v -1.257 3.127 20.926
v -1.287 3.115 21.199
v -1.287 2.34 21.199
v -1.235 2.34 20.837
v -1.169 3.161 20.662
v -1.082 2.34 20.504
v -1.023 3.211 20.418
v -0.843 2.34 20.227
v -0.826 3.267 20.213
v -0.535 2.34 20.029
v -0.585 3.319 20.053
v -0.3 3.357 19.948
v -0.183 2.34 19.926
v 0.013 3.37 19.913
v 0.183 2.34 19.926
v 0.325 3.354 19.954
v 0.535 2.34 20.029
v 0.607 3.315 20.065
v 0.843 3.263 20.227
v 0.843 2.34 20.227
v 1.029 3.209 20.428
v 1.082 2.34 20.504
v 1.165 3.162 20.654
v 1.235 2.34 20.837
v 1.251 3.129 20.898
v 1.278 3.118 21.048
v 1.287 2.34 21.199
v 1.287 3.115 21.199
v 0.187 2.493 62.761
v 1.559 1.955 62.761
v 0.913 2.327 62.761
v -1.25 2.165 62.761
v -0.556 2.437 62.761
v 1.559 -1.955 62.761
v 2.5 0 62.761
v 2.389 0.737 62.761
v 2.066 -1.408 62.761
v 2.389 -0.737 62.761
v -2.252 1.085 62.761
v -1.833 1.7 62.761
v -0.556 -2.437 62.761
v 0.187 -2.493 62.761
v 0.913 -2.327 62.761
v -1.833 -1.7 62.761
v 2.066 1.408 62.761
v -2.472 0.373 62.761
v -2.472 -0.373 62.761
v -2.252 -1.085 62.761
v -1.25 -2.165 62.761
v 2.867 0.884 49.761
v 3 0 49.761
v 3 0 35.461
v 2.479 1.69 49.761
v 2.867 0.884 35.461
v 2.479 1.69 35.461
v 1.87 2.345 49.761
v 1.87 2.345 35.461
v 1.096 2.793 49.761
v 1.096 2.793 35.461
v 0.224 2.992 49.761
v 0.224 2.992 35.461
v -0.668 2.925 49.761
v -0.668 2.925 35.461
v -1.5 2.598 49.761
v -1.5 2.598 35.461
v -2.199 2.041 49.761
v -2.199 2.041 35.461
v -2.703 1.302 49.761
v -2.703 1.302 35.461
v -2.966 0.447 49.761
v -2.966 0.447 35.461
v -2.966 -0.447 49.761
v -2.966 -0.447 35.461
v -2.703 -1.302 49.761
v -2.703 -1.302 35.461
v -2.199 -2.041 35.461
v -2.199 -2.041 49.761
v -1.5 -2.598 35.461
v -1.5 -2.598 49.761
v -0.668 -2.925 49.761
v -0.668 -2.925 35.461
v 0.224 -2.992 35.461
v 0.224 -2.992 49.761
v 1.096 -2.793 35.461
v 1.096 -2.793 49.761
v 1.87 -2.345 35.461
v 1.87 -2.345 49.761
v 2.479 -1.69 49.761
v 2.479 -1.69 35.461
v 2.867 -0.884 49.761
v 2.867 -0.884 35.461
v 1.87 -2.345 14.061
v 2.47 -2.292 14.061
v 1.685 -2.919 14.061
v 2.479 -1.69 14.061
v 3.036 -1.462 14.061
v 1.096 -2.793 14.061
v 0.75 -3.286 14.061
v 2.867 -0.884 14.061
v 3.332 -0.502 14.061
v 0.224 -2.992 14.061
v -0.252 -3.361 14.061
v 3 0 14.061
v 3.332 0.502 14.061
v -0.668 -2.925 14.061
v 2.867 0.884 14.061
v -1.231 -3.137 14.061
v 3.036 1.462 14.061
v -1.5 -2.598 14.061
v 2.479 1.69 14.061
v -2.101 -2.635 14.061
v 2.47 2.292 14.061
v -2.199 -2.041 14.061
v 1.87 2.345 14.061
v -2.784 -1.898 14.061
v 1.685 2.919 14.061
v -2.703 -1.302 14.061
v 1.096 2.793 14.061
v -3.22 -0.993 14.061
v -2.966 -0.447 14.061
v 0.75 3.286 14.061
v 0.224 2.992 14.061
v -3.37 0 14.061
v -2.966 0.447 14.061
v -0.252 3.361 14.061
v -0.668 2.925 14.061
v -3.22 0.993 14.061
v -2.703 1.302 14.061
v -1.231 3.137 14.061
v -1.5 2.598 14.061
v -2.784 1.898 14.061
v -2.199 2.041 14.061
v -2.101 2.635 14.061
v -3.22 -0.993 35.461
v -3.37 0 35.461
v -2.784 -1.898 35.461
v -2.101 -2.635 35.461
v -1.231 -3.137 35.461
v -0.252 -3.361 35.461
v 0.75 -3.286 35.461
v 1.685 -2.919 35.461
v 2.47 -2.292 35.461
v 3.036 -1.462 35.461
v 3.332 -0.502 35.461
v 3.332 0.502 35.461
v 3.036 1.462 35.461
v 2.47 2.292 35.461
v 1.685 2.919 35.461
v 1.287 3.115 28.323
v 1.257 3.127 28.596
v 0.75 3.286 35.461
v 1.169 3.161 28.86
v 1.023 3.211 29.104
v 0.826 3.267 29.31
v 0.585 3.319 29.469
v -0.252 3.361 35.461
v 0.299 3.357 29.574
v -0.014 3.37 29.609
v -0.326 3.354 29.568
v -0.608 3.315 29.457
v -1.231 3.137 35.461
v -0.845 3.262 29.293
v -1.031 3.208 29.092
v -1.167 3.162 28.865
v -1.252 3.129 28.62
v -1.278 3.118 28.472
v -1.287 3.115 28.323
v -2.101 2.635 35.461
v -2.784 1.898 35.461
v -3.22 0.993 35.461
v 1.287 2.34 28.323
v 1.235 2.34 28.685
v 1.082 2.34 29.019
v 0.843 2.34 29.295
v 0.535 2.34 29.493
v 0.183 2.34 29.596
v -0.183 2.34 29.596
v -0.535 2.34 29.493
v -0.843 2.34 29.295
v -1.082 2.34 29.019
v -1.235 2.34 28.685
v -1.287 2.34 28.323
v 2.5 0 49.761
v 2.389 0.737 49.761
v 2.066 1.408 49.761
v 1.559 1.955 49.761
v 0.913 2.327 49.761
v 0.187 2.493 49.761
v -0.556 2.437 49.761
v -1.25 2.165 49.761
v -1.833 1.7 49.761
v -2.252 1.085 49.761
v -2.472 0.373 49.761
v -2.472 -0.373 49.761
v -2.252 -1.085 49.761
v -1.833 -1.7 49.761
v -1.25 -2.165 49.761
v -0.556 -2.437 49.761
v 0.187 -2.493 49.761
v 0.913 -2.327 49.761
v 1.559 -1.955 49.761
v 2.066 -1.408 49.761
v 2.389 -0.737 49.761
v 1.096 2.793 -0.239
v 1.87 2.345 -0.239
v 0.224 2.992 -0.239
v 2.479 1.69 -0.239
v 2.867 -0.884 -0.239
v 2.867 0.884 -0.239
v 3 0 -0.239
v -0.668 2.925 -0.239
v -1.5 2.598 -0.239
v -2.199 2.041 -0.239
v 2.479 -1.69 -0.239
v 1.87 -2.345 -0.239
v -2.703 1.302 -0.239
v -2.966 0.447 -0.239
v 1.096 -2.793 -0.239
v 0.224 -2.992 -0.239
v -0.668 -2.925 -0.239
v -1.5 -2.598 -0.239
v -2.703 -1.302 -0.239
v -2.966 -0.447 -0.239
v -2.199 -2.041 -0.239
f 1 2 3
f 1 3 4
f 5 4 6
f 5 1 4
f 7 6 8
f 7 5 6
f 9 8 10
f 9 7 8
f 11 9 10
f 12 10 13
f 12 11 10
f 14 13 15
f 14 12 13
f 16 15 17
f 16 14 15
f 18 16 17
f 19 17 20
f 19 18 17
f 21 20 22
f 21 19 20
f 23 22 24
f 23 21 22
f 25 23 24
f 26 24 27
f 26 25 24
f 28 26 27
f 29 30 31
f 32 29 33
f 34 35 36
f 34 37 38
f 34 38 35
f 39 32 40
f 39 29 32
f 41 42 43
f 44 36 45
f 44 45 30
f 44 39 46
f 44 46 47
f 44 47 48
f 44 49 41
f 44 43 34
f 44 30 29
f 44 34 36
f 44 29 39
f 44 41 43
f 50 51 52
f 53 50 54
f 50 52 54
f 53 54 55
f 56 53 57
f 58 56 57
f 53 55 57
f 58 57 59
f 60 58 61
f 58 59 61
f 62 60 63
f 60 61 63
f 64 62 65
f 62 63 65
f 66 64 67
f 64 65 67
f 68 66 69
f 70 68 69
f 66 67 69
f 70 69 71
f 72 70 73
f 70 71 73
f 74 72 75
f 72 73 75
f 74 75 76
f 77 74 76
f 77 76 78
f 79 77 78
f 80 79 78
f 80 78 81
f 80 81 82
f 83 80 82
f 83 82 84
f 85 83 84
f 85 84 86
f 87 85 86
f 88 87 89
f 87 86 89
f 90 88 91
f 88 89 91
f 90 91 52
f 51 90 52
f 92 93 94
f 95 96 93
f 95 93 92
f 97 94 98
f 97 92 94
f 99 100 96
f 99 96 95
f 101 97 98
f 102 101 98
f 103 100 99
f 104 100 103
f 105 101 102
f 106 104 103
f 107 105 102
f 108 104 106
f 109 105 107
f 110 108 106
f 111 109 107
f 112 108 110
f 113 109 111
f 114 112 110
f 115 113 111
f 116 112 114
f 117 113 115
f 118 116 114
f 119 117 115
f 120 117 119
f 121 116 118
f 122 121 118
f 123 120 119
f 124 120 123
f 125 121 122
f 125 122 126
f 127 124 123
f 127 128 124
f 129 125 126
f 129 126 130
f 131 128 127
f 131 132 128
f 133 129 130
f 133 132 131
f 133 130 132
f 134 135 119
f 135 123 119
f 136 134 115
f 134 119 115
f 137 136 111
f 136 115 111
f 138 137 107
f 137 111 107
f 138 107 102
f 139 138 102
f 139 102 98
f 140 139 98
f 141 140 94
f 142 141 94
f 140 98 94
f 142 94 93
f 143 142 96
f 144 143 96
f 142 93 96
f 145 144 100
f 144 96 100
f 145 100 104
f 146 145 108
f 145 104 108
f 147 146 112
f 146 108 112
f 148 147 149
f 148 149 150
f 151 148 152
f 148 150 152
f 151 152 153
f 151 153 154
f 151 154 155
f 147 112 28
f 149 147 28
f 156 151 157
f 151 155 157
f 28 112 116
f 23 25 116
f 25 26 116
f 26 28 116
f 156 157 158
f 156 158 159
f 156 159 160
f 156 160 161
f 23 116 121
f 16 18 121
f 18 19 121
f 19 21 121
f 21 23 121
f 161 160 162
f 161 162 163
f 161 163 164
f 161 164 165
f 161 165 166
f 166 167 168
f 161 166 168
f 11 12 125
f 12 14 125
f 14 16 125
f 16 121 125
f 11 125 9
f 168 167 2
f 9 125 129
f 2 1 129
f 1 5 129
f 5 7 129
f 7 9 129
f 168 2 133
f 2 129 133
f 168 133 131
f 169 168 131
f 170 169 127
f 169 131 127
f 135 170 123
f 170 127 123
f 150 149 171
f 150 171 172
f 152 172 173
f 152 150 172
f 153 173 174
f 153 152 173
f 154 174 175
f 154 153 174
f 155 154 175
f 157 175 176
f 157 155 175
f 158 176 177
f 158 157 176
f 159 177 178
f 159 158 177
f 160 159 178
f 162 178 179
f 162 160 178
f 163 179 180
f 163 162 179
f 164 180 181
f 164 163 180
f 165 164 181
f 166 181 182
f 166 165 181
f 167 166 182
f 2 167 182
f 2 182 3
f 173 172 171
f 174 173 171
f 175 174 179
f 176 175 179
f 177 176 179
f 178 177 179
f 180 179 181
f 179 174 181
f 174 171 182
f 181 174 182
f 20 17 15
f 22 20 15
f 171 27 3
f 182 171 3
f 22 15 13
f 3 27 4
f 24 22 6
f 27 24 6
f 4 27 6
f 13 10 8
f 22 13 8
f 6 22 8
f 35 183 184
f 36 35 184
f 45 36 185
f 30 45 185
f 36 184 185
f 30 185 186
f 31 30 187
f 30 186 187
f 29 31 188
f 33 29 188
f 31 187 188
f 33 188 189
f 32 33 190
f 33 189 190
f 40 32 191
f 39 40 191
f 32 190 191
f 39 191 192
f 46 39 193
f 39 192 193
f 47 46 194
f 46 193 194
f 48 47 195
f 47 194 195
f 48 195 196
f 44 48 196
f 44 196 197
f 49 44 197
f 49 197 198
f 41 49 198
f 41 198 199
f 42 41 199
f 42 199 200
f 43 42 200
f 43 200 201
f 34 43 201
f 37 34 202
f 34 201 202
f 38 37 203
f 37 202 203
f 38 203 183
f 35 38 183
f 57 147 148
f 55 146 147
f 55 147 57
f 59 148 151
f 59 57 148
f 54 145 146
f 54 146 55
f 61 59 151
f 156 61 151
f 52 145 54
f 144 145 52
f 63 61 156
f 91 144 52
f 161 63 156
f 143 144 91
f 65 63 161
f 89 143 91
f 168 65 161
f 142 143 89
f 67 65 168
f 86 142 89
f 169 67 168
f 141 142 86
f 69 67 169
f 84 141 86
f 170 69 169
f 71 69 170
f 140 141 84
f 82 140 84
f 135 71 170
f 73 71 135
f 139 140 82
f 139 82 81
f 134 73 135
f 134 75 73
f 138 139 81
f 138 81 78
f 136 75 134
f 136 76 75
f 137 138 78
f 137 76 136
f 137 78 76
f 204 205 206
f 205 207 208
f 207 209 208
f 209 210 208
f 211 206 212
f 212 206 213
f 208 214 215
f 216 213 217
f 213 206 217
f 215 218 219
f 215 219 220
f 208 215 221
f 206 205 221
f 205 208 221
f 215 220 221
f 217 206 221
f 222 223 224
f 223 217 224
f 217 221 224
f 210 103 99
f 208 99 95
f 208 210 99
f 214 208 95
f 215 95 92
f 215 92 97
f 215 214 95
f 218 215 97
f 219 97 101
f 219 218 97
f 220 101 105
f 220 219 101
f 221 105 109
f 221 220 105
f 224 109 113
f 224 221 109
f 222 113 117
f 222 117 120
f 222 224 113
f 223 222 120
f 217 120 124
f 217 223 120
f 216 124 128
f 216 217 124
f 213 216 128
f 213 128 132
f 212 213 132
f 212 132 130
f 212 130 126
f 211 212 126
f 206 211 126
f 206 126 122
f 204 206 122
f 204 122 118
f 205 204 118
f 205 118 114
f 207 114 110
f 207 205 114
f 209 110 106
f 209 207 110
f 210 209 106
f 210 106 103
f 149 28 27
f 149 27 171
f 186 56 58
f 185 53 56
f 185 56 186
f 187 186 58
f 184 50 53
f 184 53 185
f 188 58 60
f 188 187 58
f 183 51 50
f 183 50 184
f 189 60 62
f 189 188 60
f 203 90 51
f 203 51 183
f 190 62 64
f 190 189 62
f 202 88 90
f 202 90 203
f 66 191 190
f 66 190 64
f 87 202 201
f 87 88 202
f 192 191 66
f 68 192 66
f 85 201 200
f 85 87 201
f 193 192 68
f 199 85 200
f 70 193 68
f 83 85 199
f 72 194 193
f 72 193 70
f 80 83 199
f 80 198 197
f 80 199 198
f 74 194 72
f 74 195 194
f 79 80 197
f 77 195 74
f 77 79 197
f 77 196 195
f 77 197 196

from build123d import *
from OCP.BRepAlgoAPI import BRepAlgoAPI_Cut
from OCP.TopTools import TopTools_ListOfShape

# Parameters (mm, degrees)
EXTRUDE_START       = -0.238871
SKETCH_1_R          = 3.37
EXTRUDE_1_DEPTH     = 50.000001
EXTRUDE_START_2     = 21.199419
EXTRUDE_2_DEPTH     = 7.123452
SKETCH_3_R          = 3.37
EXTRUDE_3_DEPTH     = 13
CUT_EXTRUDE_START   = -13
SKETCH_4_R          = 3.37
SKETCH_4_R_2        = 2.5
CUT_EXTRUDE_1_DEPTH = 13
CUT_EXTRUDE_START_2 = -14.3
SKETCH_5_R          = 3.37
SKETCH_5_R_2        = 3
CUT_EXTRUDE_2_DEPTH = 14.3
SKETCH_6_R          = 3.37
SKETCH_6_R_2        = 3
CUT_EXTRUDE_3_DEPTH = 14.3
CUT_EXTRUDE_4_DEPTH = 2


with BuildPart() as part:
    # 草图1 → 凸台-拉伸1 (new body)
    with BuildSketch(Plane.XY.offset(EXTRUDE_START)):
        with Locations(Location((0, 0, 0), (0, 0, 180))):
            Circle(SKETCH_1_R)
    extrude(amount=EXTRUDE_1_DEPTH)

    # 草图2 → 凸台-拉伸2 (add)
    with BuildSketch(Plane.XY.offset(EXTRUDE_START_2)):
        with BuildLine():
            Line((-1.286694662, 4.34), (1.286694662, 4.34))
            Line((1.286694662, 4.34), (1.286694662, 3.1146937))
            ThreePointArc((1.286694662, 3.1146937), (0, -3.37), (-1.286694662, 3.1146937))
            Line((-1.286694662, 3.1146937), (-1.286694662, 4.34))
        make_face()
    extrude(amount=EXTRUDE_2_DEPTH)

    # 草图3 → 凸台-拉伸3 (add)
    with BuildSketch(Plane.XY.offset(49.761129495)):
        with Locations(Location((0, 0, 0), (0, 0, 180))):
            Circle(SKETCH_3_R)
    extrude(amount=EXTRUDE_3_DEPTH)

    # 草图4 → 切除-拉伸1 (cut)
    with BuildSketch(Plane.XY.offset(62.761129495).offset(CUT_EXTRUDE_START)):
        with Locations(Location((0, 0, 0), (0, 0, 180))):
            Circle(SKETCH_4_R)
        Circle(SKETCH_4_R_2, mode=Mode.SUBTRACT)
    extrude(amount=CUT_EXTRUDE_1_DEPTH, mode=Mode.SUBTRACT)

    # 草图5 → 切除-拉伸2 (cut)
    with BuildSketch(Plane.XY.offset(49.761129495).offset(CUT_EXTRUDE_START_2)):
        with Locations(Location((0, 0, 0), (0, 0, 180))):
            Circle(SKETCH_5_R)
        Circle(SKETCH_5_R_2, mode=Mode.SUBTRACT)
    extrude(amount=CUT_EXTRUDE_2_DEPTH, mode=Mode.SUBTRACT)


with BuildPart() as cut_extrude_3_tool:
    # 草图6 → 切除-拉伸3 (new body)
    with BuildSketch(Plane(origin=(0, 0, -0.238870505), x_dir=(-1, 0, 0), z_dir=(0, 0, -1))):
        Circle(SKETCH_6_R)
        with Locations(Location((0, 0, 0), (0, 0, 180))):
            Circle(SKETCH_6_R_2, mode=Mode.SUBTRACT)
    extrude(amount=-CUT_EXTRUDE_3_DEPTH)


with BuildPart() as part_1:
    add(part.part)

    # 切除-拉伸3: cut by cut_extrude_3_tool, with a tolerance
    cut_extrude_3_stock = TopTools_ListOfShape()
    cut_extrude_3_stock.Append(part_1.part.wrapped)
    cut_extrude_3_tools = TopTools_ListOfShape()
    cut_extrude_3_tools.Append(cut_extrude_3_tool.part.wrapped)
    cut_extrude_3_cut = BRepAlgoAPI_Cut()
    cut_extrude_3_cut.SetArguments(cut_extrude_3_stock)
    cut_extrude_3_cut.SetTools(cut_extrude_3_tools)
    cut_extrude_3_cut.SetFuzzyValue(0.00001)
    cut_extrude_3_cut.Build()
    add(Compound.cast(cut_extrude_3_cut.Shape()).solids(), mode=Mode.REPLACE)

    # 草图7 → 切除-拉伸4 (cut)
    with BuildSketch(Plane(origin=(0, 4.34, 0), x_dir=(1, 0, 0), z_dir=(0, 1, 0))):
        with BuildLine():
            Line((-1.286694662, -28.322870736), (-1.286694662, -21.199418736))
            ThreePointArc((-1.286694662, -21.199418736), (0, -19.912724074), (1.286694662, -21.199418736))
            Line((1.286694662, -21.199418736), (1.286694662, -28.322870736))
            ThreePointArc((1.286694662, -28.322870736), (0, -29.609565398), (-1.286694662, -28.322870736))
        make_face()
    extrude(amount=-CUT_EXTRUDE_4_DEPTH, mode=Mode.SUBTRACT)


solid = part_1.part
